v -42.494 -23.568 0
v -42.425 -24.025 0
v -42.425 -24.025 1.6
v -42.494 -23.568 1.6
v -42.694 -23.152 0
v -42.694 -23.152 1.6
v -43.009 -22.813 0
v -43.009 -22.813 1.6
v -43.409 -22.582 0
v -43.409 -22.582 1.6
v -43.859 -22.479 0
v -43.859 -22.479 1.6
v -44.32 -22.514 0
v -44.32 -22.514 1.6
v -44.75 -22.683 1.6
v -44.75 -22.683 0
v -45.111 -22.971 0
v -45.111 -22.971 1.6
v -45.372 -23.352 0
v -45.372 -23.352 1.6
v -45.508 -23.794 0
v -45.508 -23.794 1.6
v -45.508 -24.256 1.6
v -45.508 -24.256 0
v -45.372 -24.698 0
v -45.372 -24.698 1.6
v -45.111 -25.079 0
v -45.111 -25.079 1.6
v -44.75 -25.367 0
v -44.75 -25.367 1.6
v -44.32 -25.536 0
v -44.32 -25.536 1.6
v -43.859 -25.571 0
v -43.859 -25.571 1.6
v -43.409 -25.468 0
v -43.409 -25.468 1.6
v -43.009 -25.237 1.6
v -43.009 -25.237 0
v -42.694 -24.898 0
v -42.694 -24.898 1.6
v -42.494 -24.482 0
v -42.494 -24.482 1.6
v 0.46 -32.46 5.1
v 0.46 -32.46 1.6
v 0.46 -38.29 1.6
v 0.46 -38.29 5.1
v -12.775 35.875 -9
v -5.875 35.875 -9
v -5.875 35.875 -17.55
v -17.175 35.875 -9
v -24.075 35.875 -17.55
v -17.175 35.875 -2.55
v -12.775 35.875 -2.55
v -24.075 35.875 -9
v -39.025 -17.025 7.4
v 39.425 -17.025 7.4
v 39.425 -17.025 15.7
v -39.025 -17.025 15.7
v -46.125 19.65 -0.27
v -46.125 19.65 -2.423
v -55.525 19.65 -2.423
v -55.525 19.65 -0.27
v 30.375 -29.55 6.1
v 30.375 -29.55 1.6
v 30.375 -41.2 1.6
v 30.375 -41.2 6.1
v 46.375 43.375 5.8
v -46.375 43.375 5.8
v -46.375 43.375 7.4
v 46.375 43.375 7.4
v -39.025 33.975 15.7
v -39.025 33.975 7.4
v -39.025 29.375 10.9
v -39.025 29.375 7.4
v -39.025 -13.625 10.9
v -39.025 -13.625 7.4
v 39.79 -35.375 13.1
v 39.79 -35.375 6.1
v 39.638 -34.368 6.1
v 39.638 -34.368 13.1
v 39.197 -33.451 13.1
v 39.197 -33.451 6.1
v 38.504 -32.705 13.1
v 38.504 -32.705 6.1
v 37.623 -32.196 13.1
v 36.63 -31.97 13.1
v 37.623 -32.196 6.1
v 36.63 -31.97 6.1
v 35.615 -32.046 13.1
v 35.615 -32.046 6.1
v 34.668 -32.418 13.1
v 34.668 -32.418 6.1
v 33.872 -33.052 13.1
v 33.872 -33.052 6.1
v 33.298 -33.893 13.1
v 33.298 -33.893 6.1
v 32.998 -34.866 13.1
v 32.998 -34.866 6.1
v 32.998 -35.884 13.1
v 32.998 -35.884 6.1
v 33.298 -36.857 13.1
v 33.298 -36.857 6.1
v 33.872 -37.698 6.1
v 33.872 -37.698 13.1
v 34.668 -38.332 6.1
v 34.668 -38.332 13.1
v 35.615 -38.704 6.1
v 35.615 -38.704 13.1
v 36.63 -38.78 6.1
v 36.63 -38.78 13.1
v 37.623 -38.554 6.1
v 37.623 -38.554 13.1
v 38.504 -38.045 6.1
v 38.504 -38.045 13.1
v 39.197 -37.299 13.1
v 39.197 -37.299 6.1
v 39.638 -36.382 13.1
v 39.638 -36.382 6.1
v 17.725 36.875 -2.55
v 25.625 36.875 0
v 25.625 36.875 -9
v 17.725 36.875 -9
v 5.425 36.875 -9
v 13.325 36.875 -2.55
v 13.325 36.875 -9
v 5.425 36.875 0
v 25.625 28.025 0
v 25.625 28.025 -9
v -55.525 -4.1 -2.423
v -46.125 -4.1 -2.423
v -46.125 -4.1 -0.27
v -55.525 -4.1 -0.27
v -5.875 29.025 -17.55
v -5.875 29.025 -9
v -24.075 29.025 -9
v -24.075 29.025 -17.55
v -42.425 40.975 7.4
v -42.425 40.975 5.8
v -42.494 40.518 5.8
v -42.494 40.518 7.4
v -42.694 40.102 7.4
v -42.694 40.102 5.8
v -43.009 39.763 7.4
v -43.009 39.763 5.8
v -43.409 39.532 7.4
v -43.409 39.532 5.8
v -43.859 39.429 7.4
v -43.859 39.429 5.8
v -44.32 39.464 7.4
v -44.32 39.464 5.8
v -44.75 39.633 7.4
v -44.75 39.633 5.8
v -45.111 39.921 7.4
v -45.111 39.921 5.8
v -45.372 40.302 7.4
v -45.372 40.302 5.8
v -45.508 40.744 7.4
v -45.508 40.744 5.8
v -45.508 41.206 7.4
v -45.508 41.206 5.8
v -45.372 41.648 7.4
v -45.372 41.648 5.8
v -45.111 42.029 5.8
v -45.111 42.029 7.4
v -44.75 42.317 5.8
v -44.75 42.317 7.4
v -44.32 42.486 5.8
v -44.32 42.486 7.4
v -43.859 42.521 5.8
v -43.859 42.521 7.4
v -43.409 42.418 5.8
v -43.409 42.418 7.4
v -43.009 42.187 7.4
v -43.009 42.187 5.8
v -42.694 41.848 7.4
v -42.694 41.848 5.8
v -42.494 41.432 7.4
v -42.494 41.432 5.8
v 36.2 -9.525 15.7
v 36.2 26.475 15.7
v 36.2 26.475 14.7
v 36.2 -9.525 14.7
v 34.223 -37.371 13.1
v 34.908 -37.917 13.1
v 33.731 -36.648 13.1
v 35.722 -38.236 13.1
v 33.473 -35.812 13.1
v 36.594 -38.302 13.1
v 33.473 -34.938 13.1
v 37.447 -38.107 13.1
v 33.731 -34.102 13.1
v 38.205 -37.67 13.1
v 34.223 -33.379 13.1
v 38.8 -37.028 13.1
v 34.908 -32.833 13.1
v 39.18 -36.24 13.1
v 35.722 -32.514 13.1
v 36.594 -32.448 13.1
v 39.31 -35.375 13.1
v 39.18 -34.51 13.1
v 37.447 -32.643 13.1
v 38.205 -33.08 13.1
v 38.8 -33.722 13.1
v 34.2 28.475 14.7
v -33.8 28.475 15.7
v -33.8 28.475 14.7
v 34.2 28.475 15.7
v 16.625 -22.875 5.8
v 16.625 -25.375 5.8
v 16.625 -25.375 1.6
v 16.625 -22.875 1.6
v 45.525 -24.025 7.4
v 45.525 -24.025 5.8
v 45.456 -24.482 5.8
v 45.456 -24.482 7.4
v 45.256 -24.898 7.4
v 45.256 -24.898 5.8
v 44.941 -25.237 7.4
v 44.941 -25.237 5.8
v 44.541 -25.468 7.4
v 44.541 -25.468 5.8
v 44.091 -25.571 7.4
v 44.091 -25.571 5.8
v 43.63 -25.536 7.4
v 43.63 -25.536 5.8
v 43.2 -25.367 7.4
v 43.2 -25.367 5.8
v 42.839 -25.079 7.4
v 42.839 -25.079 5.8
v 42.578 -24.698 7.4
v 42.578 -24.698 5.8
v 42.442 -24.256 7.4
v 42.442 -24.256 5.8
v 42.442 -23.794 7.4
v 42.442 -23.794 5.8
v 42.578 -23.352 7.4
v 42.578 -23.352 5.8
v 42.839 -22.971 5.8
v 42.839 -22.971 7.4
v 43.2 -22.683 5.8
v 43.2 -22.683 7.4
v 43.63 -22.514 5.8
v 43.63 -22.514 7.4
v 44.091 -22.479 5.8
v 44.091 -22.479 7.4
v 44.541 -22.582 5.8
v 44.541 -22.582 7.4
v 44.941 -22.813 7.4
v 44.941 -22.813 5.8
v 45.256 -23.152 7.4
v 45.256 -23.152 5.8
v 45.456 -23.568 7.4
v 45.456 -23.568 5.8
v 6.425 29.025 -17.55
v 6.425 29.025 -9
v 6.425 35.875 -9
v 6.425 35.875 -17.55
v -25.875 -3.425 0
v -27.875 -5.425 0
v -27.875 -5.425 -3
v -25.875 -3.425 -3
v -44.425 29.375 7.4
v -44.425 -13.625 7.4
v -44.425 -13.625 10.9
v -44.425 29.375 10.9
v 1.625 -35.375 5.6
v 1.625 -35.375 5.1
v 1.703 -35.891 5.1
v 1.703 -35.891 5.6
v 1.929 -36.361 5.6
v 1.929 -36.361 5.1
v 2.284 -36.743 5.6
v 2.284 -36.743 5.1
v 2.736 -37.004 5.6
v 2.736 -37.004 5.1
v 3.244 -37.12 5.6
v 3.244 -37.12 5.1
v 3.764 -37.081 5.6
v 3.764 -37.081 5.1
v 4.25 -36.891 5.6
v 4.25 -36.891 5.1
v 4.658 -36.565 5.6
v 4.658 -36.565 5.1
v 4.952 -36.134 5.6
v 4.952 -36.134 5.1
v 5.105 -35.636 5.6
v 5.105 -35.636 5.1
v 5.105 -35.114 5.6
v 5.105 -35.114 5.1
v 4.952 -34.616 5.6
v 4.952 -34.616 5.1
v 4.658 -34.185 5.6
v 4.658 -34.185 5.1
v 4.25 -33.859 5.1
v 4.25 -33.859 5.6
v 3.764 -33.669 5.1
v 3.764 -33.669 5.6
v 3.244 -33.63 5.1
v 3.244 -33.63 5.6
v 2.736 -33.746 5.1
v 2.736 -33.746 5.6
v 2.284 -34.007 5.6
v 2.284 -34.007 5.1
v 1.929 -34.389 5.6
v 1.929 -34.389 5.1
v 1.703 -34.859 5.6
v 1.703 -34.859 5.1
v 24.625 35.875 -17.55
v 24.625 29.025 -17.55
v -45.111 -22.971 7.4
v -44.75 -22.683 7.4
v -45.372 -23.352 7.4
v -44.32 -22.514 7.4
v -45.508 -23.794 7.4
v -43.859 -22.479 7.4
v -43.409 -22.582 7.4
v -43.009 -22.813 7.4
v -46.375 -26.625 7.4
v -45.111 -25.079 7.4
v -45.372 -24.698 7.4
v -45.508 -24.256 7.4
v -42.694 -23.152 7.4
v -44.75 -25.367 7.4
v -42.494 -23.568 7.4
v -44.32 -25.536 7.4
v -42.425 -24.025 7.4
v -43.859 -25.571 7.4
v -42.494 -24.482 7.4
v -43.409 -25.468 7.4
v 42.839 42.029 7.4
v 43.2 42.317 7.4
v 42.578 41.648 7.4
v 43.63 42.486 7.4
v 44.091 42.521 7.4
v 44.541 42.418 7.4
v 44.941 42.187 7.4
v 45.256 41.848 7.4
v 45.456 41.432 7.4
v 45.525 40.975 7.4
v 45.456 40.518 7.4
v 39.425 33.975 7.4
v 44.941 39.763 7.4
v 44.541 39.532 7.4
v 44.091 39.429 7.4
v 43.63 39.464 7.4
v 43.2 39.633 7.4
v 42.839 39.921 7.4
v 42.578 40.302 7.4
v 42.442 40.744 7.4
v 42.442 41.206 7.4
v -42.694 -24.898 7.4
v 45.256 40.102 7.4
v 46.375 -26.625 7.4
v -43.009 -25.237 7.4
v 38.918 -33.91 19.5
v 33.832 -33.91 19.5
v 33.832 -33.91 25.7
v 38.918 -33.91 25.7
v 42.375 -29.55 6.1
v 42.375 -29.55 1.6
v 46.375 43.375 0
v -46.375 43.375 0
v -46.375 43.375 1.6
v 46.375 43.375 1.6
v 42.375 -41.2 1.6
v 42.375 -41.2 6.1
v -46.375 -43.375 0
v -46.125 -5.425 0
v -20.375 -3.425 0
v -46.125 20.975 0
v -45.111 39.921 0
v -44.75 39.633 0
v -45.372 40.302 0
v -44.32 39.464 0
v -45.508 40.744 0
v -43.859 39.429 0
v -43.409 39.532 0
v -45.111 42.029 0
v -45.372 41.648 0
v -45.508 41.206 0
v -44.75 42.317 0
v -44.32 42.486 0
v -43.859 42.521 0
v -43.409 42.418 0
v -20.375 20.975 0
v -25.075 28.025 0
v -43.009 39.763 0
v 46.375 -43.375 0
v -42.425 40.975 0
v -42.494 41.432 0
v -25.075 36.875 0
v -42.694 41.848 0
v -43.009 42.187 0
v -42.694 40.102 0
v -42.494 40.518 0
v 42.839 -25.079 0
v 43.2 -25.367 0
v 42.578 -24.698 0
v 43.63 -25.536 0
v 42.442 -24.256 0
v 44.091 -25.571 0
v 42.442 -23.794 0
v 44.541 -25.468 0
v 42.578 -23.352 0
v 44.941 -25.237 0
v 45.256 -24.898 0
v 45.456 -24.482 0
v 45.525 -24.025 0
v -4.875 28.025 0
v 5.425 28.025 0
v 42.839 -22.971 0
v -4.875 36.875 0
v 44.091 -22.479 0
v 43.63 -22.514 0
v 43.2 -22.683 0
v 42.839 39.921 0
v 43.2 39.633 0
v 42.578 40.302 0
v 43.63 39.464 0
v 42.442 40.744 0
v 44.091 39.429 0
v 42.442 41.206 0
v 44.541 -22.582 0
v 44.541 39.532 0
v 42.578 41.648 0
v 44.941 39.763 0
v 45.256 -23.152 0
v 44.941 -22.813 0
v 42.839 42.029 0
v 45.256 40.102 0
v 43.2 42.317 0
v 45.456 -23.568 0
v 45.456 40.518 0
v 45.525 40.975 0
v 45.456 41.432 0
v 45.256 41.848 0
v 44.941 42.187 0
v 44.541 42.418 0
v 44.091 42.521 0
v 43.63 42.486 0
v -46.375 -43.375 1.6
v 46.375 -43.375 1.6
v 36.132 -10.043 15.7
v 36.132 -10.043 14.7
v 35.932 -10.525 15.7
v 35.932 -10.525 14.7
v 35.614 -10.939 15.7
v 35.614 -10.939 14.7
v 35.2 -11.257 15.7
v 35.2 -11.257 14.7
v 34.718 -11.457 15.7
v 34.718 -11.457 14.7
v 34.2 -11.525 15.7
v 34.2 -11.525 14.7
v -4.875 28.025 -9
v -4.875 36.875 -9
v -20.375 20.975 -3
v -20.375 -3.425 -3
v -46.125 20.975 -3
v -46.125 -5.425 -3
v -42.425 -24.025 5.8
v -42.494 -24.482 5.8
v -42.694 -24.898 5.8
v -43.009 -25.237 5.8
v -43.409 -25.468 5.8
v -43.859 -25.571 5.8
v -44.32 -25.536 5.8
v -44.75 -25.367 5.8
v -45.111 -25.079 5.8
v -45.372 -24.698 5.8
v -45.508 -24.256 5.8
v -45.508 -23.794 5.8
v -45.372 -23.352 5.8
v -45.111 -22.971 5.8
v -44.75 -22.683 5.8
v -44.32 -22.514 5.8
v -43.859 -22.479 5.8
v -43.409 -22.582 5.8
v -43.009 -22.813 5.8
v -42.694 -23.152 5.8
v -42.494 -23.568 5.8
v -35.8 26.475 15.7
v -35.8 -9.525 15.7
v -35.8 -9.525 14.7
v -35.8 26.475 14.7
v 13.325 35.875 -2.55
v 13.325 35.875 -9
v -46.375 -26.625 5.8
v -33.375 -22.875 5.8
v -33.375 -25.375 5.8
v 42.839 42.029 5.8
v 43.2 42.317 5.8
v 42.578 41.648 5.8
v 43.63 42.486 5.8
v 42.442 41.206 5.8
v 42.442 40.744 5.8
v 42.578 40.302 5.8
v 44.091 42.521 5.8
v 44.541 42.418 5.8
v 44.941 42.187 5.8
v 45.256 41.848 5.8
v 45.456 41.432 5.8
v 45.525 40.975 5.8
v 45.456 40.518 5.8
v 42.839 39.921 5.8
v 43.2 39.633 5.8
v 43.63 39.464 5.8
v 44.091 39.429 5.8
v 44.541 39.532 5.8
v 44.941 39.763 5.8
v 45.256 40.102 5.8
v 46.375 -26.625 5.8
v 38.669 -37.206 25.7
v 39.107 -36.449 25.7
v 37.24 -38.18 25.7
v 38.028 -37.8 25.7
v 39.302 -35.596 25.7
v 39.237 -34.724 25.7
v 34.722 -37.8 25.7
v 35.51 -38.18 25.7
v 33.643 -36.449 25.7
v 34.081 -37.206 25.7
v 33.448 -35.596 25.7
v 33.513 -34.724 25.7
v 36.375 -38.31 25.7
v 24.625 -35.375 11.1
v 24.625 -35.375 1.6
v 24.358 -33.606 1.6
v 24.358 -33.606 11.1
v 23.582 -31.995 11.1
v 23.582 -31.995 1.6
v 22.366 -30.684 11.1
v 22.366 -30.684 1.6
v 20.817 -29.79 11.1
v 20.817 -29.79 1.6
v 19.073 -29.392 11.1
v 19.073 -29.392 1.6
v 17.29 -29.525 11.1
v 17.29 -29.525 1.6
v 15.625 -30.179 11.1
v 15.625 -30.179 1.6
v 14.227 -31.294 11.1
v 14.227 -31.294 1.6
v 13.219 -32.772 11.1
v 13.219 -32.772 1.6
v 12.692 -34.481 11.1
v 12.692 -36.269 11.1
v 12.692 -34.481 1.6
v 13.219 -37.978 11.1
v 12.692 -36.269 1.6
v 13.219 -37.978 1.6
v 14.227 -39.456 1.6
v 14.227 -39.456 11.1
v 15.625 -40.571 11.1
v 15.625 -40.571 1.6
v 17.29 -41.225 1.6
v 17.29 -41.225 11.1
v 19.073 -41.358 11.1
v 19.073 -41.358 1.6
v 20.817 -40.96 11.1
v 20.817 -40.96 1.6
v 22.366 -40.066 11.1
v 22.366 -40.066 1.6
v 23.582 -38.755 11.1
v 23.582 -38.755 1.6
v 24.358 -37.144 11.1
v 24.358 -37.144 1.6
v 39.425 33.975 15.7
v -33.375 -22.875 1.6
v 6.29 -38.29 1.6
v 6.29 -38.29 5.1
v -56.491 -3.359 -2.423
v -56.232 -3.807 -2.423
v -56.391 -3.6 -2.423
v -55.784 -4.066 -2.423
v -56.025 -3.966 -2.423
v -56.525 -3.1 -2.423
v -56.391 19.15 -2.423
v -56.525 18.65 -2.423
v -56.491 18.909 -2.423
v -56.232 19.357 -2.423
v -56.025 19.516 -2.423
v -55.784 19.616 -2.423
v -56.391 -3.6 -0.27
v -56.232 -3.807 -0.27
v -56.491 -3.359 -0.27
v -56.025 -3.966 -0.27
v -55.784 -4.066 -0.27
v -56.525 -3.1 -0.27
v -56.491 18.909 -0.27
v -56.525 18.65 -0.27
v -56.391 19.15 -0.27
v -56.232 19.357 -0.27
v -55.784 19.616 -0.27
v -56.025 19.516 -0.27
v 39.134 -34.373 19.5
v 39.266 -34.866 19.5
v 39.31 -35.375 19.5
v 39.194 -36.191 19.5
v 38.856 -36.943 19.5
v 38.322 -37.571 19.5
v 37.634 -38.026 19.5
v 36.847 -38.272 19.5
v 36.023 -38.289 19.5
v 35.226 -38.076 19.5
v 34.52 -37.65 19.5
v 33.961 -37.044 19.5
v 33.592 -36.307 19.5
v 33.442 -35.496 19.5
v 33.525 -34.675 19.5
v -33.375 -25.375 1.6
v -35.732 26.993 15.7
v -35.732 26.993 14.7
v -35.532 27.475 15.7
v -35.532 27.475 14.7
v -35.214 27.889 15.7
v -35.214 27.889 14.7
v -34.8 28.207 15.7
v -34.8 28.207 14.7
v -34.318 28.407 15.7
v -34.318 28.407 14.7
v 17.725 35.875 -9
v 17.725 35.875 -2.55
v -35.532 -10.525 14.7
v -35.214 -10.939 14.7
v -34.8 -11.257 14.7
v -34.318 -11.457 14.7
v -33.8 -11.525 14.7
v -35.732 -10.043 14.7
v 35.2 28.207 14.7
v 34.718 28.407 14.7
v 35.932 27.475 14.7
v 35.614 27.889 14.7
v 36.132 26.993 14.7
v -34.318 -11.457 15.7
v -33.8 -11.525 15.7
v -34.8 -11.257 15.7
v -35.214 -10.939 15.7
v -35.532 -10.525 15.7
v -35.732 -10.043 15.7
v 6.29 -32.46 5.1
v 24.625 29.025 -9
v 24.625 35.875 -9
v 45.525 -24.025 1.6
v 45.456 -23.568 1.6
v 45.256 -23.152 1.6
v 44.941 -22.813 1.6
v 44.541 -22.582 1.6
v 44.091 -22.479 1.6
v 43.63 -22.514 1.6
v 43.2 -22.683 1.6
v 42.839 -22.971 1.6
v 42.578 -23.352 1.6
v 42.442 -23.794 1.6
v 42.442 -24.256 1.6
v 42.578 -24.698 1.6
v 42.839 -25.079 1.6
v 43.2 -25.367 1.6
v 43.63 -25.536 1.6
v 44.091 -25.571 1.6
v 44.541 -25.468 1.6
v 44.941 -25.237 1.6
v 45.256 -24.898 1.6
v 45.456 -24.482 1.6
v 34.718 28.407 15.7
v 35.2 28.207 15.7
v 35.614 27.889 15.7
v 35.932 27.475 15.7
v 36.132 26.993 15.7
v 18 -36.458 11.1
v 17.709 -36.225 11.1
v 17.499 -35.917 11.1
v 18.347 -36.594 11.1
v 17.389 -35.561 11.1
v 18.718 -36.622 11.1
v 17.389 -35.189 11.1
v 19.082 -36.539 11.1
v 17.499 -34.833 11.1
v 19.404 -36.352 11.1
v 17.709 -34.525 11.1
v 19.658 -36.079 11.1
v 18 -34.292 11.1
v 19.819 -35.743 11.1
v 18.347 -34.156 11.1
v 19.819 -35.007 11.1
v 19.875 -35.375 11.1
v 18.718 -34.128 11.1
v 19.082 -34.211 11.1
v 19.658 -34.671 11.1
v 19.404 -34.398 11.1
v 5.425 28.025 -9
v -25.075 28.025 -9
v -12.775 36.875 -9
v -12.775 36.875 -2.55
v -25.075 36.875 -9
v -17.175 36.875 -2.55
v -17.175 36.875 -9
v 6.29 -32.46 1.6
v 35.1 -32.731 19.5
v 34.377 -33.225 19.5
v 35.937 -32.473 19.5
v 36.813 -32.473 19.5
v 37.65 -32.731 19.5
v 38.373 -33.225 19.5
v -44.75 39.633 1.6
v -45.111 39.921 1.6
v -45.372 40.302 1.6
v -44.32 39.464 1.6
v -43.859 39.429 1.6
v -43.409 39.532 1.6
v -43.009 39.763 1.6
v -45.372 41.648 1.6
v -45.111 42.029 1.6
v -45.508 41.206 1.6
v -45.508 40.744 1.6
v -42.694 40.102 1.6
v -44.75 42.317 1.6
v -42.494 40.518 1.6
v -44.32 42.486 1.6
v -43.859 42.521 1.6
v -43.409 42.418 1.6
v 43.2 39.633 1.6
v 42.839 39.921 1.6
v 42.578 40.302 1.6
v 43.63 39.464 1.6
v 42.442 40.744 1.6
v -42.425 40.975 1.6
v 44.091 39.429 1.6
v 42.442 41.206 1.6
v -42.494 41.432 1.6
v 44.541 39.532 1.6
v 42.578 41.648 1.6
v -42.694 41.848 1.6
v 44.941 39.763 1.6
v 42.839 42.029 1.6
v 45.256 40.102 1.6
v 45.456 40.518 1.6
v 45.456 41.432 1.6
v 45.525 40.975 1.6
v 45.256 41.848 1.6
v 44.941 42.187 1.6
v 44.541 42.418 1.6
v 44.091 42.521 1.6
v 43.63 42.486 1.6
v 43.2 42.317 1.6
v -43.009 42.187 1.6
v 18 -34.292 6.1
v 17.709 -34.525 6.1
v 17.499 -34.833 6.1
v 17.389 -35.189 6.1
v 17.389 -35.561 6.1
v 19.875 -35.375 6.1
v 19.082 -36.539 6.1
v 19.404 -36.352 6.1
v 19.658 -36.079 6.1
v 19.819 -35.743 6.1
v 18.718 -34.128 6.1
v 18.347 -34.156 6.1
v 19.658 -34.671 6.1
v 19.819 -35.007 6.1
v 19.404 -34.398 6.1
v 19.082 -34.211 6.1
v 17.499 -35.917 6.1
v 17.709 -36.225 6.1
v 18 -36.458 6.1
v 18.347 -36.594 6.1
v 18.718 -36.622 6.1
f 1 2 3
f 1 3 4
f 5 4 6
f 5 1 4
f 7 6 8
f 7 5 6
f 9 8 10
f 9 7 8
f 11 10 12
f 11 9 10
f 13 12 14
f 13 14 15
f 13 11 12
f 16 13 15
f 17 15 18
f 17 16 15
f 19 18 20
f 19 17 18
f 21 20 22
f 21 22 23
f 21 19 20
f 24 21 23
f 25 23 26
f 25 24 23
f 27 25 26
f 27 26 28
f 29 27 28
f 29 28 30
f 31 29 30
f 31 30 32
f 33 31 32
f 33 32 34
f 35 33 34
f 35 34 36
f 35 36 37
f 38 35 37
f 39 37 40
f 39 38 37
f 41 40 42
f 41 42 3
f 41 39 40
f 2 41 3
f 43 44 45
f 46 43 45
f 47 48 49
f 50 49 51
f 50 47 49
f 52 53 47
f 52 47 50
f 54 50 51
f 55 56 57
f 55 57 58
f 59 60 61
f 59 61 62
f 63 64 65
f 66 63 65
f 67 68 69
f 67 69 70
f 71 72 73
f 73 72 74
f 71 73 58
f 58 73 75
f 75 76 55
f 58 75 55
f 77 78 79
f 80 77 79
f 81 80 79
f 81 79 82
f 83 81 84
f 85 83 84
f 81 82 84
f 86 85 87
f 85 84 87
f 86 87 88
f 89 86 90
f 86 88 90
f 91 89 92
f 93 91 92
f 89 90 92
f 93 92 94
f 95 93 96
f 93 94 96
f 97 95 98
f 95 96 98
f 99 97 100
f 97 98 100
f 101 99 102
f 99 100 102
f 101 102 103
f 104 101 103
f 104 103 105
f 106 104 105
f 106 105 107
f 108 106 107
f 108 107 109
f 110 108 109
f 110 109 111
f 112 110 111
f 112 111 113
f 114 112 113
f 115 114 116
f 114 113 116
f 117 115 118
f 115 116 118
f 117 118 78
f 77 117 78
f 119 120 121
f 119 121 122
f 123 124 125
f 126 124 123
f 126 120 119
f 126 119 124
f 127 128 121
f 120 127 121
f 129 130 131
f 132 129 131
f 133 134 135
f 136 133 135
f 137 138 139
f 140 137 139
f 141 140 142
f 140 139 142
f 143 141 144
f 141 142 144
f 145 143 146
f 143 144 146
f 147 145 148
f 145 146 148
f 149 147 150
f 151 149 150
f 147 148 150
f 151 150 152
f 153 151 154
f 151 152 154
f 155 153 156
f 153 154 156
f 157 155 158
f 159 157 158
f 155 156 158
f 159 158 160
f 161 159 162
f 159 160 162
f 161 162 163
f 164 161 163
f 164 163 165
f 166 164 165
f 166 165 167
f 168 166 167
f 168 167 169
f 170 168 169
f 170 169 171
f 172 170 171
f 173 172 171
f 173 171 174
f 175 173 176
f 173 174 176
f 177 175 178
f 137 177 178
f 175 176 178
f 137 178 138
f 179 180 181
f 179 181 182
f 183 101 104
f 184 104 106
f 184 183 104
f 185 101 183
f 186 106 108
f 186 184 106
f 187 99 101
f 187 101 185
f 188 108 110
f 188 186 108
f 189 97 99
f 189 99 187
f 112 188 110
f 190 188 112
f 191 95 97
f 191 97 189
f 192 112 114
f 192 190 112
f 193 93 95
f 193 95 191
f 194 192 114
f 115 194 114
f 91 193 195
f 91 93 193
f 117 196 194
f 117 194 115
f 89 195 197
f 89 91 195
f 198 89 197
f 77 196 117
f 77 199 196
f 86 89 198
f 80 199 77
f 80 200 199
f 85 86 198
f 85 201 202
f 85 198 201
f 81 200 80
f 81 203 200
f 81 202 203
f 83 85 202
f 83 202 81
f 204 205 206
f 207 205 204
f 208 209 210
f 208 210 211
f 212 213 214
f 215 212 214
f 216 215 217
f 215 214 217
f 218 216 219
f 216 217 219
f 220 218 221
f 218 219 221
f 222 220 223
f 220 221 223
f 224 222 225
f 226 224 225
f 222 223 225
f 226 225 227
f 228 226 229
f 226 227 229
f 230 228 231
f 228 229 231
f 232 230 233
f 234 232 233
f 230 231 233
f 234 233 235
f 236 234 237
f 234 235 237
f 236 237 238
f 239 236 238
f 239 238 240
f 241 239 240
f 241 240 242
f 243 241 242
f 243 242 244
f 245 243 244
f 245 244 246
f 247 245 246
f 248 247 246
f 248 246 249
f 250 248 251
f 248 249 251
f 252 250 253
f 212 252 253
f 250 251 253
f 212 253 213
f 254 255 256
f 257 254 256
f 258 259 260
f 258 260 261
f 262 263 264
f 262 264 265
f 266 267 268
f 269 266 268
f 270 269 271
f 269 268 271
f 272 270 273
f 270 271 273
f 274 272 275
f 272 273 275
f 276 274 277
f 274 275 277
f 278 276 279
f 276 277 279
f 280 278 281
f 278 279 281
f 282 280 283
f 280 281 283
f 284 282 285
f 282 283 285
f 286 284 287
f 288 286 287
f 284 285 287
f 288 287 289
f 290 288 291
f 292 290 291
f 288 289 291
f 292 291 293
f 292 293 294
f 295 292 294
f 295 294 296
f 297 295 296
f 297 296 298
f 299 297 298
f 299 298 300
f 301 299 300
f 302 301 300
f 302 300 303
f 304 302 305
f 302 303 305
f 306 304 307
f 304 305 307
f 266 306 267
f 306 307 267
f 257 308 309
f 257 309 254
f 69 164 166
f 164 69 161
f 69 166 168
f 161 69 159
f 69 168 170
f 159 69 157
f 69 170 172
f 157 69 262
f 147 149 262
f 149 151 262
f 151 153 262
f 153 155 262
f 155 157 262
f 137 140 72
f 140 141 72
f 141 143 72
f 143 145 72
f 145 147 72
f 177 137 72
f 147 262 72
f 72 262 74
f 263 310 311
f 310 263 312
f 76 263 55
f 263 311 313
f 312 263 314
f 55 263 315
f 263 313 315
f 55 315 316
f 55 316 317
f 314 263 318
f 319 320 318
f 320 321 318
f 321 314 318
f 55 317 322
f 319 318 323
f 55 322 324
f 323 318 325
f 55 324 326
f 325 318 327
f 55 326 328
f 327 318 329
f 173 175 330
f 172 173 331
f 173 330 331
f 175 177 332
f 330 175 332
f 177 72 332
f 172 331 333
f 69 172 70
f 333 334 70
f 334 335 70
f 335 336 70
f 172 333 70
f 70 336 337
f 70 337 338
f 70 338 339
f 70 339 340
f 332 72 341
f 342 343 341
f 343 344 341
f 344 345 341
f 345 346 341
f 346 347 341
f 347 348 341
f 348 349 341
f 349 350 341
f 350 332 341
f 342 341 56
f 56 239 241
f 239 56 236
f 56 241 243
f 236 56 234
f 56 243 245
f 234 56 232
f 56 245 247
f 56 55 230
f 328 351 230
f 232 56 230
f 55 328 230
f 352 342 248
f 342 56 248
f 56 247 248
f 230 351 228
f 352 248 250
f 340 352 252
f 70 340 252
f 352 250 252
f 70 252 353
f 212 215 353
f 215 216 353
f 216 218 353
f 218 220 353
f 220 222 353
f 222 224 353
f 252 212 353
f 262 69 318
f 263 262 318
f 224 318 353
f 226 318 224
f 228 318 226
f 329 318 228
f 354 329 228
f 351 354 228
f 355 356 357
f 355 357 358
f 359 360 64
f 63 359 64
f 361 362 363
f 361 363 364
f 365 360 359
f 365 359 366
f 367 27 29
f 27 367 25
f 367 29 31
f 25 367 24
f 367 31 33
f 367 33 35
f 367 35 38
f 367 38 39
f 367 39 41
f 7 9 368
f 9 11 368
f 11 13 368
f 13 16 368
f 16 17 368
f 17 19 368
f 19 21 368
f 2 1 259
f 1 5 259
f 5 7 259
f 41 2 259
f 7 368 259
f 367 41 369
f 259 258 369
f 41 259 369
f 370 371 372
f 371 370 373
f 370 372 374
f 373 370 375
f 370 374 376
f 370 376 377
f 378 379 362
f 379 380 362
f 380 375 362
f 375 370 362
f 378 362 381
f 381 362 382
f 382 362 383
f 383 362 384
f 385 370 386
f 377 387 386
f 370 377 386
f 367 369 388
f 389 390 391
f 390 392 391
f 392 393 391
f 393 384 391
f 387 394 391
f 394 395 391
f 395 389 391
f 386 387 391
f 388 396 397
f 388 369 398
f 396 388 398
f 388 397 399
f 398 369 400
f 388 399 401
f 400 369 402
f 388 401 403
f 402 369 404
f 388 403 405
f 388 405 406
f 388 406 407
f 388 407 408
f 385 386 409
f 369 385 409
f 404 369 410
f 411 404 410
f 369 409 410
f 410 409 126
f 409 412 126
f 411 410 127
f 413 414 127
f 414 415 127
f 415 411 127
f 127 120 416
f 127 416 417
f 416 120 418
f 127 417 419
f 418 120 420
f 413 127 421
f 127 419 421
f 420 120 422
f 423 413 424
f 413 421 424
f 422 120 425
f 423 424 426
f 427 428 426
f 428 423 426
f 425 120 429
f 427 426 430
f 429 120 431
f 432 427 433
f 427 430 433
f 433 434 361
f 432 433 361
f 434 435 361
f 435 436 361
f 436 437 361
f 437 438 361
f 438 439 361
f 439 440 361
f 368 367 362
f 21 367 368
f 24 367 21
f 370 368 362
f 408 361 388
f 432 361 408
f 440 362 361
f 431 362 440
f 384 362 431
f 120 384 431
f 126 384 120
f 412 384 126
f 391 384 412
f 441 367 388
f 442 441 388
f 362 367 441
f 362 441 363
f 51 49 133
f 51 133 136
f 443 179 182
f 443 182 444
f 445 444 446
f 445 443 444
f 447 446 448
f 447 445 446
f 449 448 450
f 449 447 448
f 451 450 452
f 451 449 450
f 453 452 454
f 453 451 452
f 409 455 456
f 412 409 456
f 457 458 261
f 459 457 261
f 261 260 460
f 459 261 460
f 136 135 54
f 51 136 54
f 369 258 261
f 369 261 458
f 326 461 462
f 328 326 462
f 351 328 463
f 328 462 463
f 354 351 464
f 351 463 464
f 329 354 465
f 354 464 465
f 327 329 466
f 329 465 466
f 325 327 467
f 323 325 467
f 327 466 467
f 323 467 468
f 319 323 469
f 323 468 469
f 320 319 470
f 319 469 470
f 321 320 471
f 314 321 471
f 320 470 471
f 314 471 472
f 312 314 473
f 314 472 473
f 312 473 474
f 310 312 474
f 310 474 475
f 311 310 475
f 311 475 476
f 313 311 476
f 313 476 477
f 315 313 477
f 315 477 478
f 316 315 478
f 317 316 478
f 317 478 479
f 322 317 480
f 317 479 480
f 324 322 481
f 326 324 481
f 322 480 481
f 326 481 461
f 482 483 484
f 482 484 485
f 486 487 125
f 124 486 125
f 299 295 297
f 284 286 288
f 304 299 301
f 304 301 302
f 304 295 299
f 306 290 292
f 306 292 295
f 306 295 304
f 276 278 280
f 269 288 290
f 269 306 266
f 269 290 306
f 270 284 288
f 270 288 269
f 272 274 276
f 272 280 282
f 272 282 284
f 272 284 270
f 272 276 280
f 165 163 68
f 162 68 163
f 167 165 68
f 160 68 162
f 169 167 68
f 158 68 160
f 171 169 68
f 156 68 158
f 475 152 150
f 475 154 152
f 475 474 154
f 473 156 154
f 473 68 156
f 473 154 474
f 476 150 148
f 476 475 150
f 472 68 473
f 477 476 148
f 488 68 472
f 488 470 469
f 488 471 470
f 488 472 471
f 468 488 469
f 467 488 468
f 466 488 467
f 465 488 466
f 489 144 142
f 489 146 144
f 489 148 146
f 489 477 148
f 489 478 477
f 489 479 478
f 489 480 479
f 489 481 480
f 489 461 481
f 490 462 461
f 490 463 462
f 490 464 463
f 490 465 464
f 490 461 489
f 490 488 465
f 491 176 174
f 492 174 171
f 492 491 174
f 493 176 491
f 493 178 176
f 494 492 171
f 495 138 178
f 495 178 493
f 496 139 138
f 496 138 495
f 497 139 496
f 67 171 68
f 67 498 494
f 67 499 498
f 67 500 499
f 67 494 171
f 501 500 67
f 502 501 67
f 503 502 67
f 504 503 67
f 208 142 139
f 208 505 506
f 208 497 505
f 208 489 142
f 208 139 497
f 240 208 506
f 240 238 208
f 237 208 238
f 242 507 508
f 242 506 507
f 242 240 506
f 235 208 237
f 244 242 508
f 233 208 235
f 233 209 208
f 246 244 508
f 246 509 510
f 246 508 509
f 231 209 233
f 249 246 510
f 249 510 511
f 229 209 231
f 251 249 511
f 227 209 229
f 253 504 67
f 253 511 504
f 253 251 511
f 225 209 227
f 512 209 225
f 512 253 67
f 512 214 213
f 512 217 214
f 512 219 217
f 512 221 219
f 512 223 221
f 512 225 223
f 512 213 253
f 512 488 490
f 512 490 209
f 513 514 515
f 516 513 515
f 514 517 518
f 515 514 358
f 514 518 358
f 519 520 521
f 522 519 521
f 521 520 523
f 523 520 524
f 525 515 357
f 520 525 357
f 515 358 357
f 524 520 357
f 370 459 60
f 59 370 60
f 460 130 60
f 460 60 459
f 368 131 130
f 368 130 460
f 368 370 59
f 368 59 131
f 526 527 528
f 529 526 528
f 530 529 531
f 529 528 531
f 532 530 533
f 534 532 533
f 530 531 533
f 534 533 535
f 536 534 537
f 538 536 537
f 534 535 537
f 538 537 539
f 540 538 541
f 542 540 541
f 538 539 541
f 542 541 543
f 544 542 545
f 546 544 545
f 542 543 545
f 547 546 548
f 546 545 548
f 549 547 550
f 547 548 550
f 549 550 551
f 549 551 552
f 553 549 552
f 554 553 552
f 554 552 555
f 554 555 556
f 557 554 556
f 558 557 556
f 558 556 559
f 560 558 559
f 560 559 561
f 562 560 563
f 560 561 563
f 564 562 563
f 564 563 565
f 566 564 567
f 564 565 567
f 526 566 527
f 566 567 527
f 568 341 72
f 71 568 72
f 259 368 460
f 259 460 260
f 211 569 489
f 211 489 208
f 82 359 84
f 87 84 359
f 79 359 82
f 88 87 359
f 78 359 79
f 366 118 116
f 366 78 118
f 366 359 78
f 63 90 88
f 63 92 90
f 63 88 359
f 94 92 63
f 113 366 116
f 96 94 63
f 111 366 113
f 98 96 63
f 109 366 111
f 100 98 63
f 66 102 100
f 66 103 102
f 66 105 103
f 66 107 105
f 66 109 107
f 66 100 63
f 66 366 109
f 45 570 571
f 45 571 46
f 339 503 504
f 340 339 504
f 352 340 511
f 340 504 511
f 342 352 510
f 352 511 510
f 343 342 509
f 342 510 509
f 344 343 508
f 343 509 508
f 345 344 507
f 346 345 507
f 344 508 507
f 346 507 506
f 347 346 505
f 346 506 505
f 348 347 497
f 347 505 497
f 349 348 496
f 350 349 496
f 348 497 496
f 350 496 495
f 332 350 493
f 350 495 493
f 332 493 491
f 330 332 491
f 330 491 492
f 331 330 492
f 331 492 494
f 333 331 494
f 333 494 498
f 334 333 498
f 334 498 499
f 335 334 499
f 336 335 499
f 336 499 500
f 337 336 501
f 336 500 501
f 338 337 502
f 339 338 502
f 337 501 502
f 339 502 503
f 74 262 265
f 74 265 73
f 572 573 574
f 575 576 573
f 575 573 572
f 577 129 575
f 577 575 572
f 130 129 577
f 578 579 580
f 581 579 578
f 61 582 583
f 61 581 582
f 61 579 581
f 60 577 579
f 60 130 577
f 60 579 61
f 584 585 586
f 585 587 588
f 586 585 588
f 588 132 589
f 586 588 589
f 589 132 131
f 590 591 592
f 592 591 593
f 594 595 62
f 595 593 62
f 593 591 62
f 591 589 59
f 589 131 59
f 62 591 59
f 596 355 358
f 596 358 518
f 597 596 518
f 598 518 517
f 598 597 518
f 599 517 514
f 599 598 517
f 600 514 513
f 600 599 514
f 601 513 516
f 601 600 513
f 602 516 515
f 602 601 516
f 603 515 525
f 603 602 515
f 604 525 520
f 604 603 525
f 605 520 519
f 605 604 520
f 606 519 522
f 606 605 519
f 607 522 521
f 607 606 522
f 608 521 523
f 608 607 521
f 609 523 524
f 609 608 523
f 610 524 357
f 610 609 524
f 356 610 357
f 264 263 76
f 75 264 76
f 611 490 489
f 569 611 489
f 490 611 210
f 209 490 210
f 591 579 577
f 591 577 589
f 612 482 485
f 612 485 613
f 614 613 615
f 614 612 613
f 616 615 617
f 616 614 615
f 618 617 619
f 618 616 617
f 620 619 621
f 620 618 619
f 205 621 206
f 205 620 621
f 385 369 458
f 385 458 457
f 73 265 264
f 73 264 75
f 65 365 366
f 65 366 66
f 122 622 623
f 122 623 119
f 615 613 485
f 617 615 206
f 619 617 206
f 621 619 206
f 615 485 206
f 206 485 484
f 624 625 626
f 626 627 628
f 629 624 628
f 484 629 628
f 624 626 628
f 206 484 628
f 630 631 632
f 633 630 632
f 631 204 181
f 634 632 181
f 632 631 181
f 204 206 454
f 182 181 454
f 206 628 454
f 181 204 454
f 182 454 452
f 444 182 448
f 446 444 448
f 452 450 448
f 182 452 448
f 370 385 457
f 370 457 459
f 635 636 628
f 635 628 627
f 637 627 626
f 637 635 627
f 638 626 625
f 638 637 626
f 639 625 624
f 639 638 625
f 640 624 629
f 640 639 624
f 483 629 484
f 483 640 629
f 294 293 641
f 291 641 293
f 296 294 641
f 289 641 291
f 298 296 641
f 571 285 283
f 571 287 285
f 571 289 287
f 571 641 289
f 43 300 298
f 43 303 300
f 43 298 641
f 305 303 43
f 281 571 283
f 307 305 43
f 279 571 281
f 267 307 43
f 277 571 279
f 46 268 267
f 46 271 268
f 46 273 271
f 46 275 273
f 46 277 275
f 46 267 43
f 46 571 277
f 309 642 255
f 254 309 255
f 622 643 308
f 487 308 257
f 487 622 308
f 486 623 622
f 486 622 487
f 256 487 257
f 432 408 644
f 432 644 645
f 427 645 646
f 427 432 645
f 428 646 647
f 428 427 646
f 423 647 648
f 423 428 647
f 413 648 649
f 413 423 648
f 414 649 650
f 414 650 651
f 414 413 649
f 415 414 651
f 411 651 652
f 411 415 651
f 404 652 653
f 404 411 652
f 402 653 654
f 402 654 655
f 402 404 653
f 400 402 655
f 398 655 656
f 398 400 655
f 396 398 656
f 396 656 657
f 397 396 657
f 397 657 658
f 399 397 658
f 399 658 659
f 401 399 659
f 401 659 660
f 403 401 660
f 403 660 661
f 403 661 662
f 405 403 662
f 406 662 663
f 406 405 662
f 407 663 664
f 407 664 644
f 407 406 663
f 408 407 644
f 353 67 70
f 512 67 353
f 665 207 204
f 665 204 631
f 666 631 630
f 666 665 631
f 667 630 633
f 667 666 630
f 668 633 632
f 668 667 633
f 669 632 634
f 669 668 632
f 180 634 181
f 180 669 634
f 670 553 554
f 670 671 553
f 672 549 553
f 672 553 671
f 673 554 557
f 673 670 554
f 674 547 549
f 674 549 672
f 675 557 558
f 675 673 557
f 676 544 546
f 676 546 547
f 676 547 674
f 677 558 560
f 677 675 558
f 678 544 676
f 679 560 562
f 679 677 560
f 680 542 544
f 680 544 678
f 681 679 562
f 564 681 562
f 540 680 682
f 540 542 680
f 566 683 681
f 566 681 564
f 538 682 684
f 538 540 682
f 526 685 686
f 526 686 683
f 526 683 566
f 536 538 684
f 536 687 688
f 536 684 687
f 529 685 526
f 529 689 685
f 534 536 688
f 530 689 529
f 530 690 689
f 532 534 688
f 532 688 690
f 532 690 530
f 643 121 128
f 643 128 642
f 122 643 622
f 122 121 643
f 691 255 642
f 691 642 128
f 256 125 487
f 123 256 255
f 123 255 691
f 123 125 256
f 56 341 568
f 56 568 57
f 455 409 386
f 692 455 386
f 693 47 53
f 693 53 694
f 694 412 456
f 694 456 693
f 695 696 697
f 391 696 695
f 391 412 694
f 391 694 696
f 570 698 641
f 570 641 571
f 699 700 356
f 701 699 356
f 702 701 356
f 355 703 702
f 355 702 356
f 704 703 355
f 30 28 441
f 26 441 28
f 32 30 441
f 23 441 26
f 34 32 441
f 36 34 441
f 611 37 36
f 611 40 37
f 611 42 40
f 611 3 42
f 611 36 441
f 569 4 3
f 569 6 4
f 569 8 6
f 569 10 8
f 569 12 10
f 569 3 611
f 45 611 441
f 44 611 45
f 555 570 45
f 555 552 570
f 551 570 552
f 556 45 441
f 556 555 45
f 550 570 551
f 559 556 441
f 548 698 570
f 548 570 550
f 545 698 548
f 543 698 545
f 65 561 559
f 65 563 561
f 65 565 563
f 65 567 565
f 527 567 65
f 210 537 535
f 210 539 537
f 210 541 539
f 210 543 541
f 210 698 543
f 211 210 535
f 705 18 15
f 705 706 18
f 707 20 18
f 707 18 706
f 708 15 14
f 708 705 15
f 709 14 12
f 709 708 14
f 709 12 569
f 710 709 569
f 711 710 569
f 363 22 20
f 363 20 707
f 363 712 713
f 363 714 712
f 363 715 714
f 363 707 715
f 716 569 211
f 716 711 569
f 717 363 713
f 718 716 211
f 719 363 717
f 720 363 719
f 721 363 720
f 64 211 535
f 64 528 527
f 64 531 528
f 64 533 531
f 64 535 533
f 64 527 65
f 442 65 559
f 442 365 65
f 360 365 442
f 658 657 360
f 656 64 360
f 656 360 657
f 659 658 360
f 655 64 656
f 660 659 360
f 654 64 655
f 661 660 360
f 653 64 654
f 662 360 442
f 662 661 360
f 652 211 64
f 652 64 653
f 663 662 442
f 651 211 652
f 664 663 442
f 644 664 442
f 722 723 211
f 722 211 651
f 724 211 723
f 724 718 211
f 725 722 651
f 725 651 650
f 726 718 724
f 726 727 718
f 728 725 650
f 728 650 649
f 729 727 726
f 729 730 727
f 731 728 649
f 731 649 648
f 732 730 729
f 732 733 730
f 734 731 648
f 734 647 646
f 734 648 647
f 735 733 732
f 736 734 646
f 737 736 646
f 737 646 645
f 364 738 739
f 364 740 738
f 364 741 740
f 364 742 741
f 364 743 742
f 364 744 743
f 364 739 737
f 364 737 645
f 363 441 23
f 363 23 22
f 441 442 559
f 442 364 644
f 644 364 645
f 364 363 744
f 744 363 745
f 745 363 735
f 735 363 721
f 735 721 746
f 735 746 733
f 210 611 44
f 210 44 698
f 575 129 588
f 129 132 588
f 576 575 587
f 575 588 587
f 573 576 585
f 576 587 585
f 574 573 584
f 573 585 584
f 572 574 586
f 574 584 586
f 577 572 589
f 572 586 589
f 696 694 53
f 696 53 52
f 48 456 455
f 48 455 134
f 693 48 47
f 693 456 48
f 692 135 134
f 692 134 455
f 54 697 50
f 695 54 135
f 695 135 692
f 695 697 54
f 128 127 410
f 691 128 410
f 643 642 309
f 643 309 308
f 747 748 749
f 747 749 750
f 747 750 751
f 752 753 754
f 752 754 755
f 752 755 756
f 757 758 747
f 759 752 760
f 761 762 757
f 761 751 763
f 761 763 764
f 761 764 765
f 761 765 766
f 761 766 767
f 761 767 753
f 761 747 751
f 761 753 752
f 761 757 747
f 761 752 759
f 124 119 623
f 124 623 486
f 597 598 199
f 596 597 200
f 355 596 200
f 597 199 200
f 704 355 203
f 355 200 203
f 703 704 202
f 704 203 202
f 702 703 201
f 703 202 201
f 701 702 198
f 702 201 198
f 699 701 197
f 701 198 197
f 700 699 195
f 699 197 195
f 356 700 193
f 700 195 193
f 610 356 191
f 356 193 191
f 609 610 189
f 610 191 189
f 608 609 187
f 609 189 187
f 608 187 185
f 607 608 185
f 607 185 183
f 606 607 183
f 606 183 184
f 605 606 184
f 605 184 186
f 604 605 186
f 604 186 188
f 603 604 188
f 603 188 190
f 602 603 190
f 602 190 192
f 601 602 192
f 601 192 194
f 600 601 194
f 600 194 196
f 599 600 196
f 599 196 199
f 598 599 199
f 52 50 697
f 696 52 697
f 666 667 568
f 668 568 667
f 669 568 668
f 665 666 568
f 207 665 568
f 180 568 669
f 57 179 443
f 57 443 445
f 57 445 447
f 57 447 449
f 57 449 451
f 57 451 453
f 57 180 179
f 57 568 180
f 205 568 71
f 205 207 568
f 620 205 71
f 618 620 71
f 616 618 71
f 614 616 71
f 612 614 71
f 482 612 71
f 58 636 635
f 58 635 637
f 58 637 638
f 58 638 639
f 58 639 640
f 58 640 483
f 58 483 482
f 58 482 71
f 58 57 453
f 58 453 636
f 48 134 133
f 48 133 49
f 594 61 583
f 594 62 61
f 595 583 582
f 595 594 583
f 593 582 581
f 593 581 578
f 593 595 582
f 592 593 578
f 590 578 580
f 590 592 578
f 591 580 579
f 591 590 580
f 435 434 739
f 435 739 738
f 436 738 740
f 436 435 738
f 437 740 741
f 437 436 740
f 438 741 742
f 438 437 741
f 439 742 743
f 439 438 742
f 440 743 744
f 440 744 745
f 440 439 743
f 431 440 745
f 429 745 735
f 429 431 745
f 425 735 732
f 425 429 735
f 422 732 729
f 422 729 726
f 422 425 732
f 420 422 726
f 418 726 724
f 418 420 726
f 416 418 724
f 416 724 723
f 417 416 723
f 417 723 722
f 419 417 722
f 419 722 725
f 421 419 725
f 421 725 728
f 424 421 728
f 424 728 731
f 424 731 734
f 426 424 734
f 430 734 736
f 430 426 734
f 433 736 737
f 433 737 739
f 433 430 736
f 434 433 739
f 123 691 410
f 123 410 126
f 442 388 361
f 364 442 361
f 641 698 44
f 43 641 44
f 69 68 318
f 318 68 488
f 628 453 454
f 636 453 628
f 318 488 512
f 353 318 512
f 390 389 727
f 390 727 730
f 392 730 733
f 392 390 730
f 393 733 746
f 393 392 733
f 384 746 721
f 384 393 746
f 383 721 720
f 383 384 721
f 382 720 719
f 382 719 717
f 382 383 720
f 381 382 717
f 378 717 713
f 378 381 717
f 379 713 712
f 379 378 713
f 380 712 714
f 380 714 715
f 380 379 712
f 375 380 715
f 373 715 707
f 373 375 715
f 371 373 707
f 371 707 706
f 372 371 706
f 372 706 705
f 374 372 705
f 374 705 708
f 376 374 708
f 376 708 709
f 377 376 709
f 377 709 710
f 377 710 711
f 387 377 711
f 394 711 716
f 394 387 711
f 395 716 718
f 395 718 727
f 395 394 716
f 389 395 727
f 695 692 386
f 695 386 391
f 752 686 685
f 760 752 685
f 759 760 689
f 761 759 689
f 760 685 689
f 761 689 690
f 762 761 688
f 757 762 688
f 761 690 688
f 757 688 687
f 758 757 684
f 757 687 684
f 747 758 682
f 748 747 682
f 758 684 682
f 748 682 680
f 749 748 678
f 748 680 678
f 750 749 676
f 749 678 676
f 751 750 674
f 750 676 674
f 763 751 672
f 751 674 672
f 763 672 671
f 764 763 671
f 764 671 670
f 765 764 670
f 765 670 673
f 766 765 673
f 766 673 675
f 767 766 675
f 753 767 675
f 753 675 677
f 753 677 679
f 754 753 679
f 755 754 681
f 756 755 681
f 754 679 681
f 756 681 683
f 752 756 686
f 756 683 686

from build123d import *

# Parameters (mm, degrees)
SKETCH1_W                             = 92.75
SKETCH1_H                             = 86.75
SKETCH1_R                             = 1.55
BOSS_EXTRUDE1_FIRST_PCB_DEPTH         = 1.6
SKETCH2_R                             = 6
BOSS_EXTRUDE2_SPEAKER_DEPTH           = 9.5
SKETCH15_R                            = 1.25
CUT_EXTRUDE1_SPEAKER_HOLE_DEPTH       = 5
SKETCH3_W                             = 12
SKETCH3_H                             = 11.65
BOSS_EXTRUDE3_ROTARY_SWITCH_DEPTH     = 4.5
SKETCH4_W                             = 5.83
SKETCH4_H                             = 5.83
BOSS_EXTRUDE4_RESET_SWITCH_DEPTH      = 3.5
SKETCH5_R                             = 1.75
BOSS_EXTRUDE5_RESET_BUTTON_DEPTH      = 0.5
SKETCH16_R                            = 3.415
BOSS_EXTRUDE6_ROTARY_SWITCH_DEPTH     = 7
SKETCH17_R                            = 2.935
BOSS_EXTRUDE7_ROTARY_SWITCH_DEPTH     = 6.4
BOSS_EXTRUDE8_ROTARY_SWITCH_DEPTH     = 6.2
BOSS_EXTRUDE9_SD_CARD_SLOT_DEPTH      = 3
SKETCH19_W                            = 50
SKETCH19_H                            = 2.5
BOSS_EXTRUDE10_CONNECTOR_DEPTH        = 4.2
SKETCH11_W                            = 92.75
SKETCH11_H                            = 70
SKETCH11_R                            = 1.55
BOSS_EXTRUDE11_UPPER_PCB_DEPTH        = 1.6
SKETCH12_W                            = 78.45
SKETCH12_H                            = 51
BOSS_EXTRUDE12_LCD_DEPTH              = 8.3
SKETCH24_W                            = 5.4
SKETCH24_H                            = 43
BOSS_EXTRUDE13_LCD_BUMPOUT_DEPTH      = 3.5
CUT_EXTRUDE2_SCREEN_RECESS_DEPTH      = 1
SKETCH21_W                            = 20.2
SKETCH21_H                            = 8.85
SKETCH21_W_2                          = 18.2
SKETCH21_H_2                          = 6.85
BOSS_EXTRUDE14_CONNECTORS_DEPTH       = 9
SKETCH22_W                            = 18.2
SKETCH22_H                            = 6.85
BOSS_EXTRUDE15_CONNECTOR_RECESS_DEPTH = 2.55
SKETCH23_W                            = 4.4
SKETCH23_H                            = 1
CUT_EXTRUDE3_CONNECTOR_NOTCH_DEPTH    = 6.45
SKETCH20_W                            = 2.153
SKETCH20_H                            = 23.75
BOSS_EXTRUDE16_SD_CARD_DEPTH          = 10.4
FILLET1_SD_CARD_R                     = 1
CROQUIS1_W                            = 18.2
CROQUIS1_H                            = 6.85
SALIENTE_EXTRUIR1_DEPTH               = 15


with BuildPart() as part:
    # Sketch1 → Boss-Extrude1 - First PCB (new body)
    with BuildSketch(Plane.XY):
        Rectangle(SKETCH1_W, SKETCH1_H)
        with Locations((-43.975, 40.975)):
            Circle(SKETCH1_R, mode=Mode.SUBTRACT)
        with Locations((43.975, 40.975)):
            Circle(SKETCH1_R, mode=Mode.SUBTRACT)
        with Locations((43.975, -24.025)):
            Circle(SKETCH1_R, mode=Mode.SUBTRACT)
        with Locations((-43.975, -24.025)):
            Circle(SKETCH1_R, mode=Mode.SUBTRACT)
    extrude(amount=BOSS_EXTRUDE1_FIRST_PCB_DEPTH)

    # Sketch2 → Boss-Extrude2 - Speaker (add)
    with BuildSketch(Plane.XY.offset(1.6)):
        with Locations((18.625, -35.375)):
            Circle(SKETCH2_R)
    extrude(amount=BOSS_EXTRUDE2_SPEAKER_DEPTH)

    # Sketch15 → Cut-Extrude1 - Speaker Hole (cut)
    with BuildSketch(Plane.XY.offset(11.1)):
        with Locations((18.625, -35.375)):
            Circle(SKETCH15_R)
    extrude(amount=-CUT_EXTRUDE1_SPEAKER_HOLE_DEPTH, mode=Mode.SUBTRACT)

    # Sketch3 → Boss-Extrude3 - Rotary Switch (add)
    with BuildSketch(Plane(origin=(0, 0, 1.6), x_dir=(-1, 0, 0), z_dir=(0, 0, 1))):
        with Locations((-36.375, 35.375)):
            Rectangle(SKETCH3_W, SKETCH3_H)
    extrude(amount=BOSS_EXTRUDE3_ROTARY_SWITCH_DEPTH)

    # Sketch4 → Boss-Extrude4 - Reset Switch (add)
    with BuildSketch(Plane(origin=(0, 0, 1.6), x_dir=(-1, 0, 0), z_dir=(0, 0, 1))):
        with Locations((-3.375, 35.375)):
            Rectangle(SKETCH4_W, SKETCH4_H)
    extrude(amount=BOSS_EXTRUDE4_RESET_SWITCH_DEPTH)

    # Sketch5 → Boss-Extrude5 - Reset Button (add)
    with BuildSketch(Plane(origin=(0, 0, 5.1), x_dir=(-1, 0, 0), z_dir=(0, 0, 1))):
        with Locations((-3.375, 35.375)):
            Circle(SKETCH5_R)
    extrude(amount=BOSS_EXTRUDE5_RESET_BUTTON_DEPTH)

    # Sketch16 → Boss-Extrude6 - Rotary Switch (add)
    with BuildSketch(Plane.XY.offset(6.1)):
        with Locations((36.375, -35.375)):
            Circle(SKETCH16_R)
    extrude(amount=BOSS_EXTRUDE6_ROTARY_SWITCH_DEPTH)

    # Sketch17 → Boss-Extrude7 - Rotary Switch (add)
    with BuildSketch(Plane.XY.offset(13.1)):
        with Locations((36.375, -35.375)):
            Circle(SKETCH17_R)
    extrude(amount=BOSS_EXTRUDE7_ROTARY_SWITCH_DEPTH)

    # Sketch18 → Boss-Extrude8 - Rotary Switch (add)
    with BuildSketch(Plane.XY.offset(19.5)):
        with BuildLine():
            Line((33.831773703, -33.91), (38.918226297, -33.91))
            ThreePointArc((38.918226297, -33.91), (36.375, -38.31), (33.831773703, -33.91))
        make_face()
    extrude(amount=BOSS_EXTRUDE8_ROTARY_SWITCH_DEPTH)

    # Sketch9 → Boss-Extrude9 - SD Card Slot (add)
    with BuildSketch(Plane(origin=(0, 0, 0), x_dir=(1, 0, 0), z_dir=(0, 0, -1))):
        Polygon((-46.125, 5.425), (-27.875, 5.425), (-25.875, 3.425), (-20.375, 3.425), (-20.375, -20.975), (-46.125, -20.975), align=None)
    extrude(amount=BOSS_EXTRUDE9_SD_CARD_SLOT_DEPTH)

    # Sketch19 → Boss-Extrude10 - Connector (add)
    with BuildSketch(Plane.XY.offset(1.6)):
        with Locations((-8.375, -24.125)):
            Rectangle(SKETCH19_W, SKETCH19_H)
    extrude(amount=BOSS_EXTRUDE10_CONNECTOR_DEPTH)

    # Sketch11 → Boss-Extrude11 - Upper PCB (add)
    with BuildSketch(Plane(origin=(0, -2, 5.8), x_dir=(1, 0, 0), z_dir=(0, 0, -1))):
        with Locations((0, -10.375)):
            Rectangle(SKETCH11_W, SKETCH11_H)
        with Locations((-43.975, -42.975)):
            Circle(SKETCH11_R, mode=Mode.SUBTRACT)
        with Locations((-43.975, 22.025)):
            Circle(SKETCH11_R, mode=Mode.SUBTRACT)
        with Locations((43.975, -42.975)):
            Circle(SKETCH11_R, mode=Mode.SUBTRACT)
        with Locations((43.975, 22.025)):
            Circle(SKETCH11_R, mode=Mode.SUBTRACT)
    extrude(amount=-BOSS_EXTRUDE11_UPPER_PCB_DEPTH)

    # Sketch12 → Boss-Extrude12 - LCD (add)
    with BuildSketch(Plane(origin=(0, 0, 7.4), x_dir=(-1, 0, 0), z_dir=(0, 0, 1))):
        with Locations((-0.2, -8.475)):
            Rectangle(SKETCH12_W, SKETCH12_H)
    extrude(amount=BOSS_EXTRUDE12_LCD_DEPTH)

    # Sketch24 → Boss-Extrude13 - LCD Bumpout (add)
    with BuildSketch(Plane.XY.offset(7.4)):
        with Locations((-41.725, 7.875)):
            Rectangle(SKETCH24_W, SKETCH24_H)
    extrude(amount=BOSS_EXTRUDE13_LCD_BUMPOUT_DEPTH)

    # Sketch13 → Cut-Extrude2 - Screen Recess (cut)
    with BuildSketch(Plane(origin=(0, 0, 15.7), x_dir=(-1, 0, 0), z_dir=(0, 0, 1))):
        with BuildLine():
            Line((-34.2, 11.525), (33.8, 11.525))
            ThreePointArc((33.8, 11.525), (35.214213562, 10.939213562), (35.8, 9.525))
            Line((35.8, 9.525), (35.8, -26.475))
            ThreePointArc((35.8, -26.475), (35.214213562, -27.889213562), (33.8, -28.475))
            Line((33.8, -28.475), (-34.2, -28.475))
            ThreePointArc((-34.2, -28.475), (-35.614213562, -27.889213562), (-36.2, -26.475))
            Line((-36.2, -26.475), (-36.2, 9.525))
            ThreePointArc((-36.2, 9.525), (-35.614213562, 10.939213562), (-34.2, 11.525))
        make_face()
    extrude(amount=-CUT_EXTRUDE2_SCREEN_RECESS_DEPTH, mode=Mode.SUBTRACT)

    # Sketch21 → Boss-Extrude14 - Connectors (add)
    with BuildSketch(Plane(origin=(0, 0, 0), x_dir=(-1, 0, 0), z_dir=(0, 0, -1))):
        with Locations((-15.525, 32.45)):
            Rectangle(SKETCH21_W, SKETCH21_H)
        with Locations((-15.525, 32.45)):
            Rectangle(SKETCH21_W_2, SKETCH21_H_2, mode=Mode.SUBTRACT)
        with Locations((14.975, 32.45)):
            Rectangle(SKETCH21_W, SKETCH21_H)
        with Locations((14.975, 32.45)):
            Rectangle(SKETCH21_W_2, SKETCH21_H_2, mode=Mode.SUBTRACT)
    extrude(amount=BOSS_EXTRUDE14_CONNECTORS_DEPTH)

    # Sketch22 → Boss-Extrude15 - Connector Recess (add)
    with BuildSketch(Plane(origin=(0, 0, 0), x_dir=(-1, 0, 0), z_dir=(0, 0, -1))):
        with Locations((-15.525, 32.45)):
            Rectangle(SKETCH22_W, SKETCH22_H)
        with Locations((14.975, 32.45)):
            Rectangle(SKETCH22_W, SKETCH22_H)
    extrude(amount=BOSS_EXTRUDE15_CONNECTOR_RECESS_DEPTH)

    # Sketch23 → Cut-Extrude3 - Connector Notch (cut)
    with BuildSketch(Plane(origin=(0, 0, -9), x_dir=(-1, 0, 0), z_dir=(0, 0, -1))):
        with Locations((-15.525, 36.375)):
            Rectangle(SKETCH23_W, SKETCH23_H)
        with Locations((14.975, 36.375)):
            Rectangle(SKETCH23_W, SKETCH23_H)
    extrude(amount=-CUT_EXTRUDE3_CONNECTOR_NOTCH_DEPTH, mode=Mode.SUBTRACT)

    # Sketch20 → Boss-Extrude16 - SD Card (add)
    with BuildSketch(Plane.ZY.offset(46.125)):
        with Locations((-1.3465, 7.775)):
            Rectangle(SKETCH20_W, SKETCH20_H)
    extrude(amount=BOSS_EXTRUDE16_SD_CARD_DEPTH)

    # Fillet1 - SD Card
    fillet1_sd_card_edges = [part.edges().sort_by_distance(p)[0] for p in [
        (-56.525, -4.1, -1.3465),
        (-56.525, 19.65, -1.3465),
    ]]
    fillet(fillet1_sd_card_edges, radius=FILLET1_SD_CARD_R)

    # Croquis1 → Saliente-Extruir1 (add)
    with BuildSketch(Plane(origin=(0, 0, -2.55), x_dir=(-1, 0, 0), z_dir=(0, 0, -1))):
        with Locations((-15.525, 32.45)):
            Rectangle(CROQUIS1_W, CROQUIS1_H)
        with Locations((14.975, 32.45)):
            Rectangle(CROQUIS1_W, CROQUIS1_H)
    extrude(amount=SALIENTE_EXTRUIR1_DEPTH)


solid = part.part
